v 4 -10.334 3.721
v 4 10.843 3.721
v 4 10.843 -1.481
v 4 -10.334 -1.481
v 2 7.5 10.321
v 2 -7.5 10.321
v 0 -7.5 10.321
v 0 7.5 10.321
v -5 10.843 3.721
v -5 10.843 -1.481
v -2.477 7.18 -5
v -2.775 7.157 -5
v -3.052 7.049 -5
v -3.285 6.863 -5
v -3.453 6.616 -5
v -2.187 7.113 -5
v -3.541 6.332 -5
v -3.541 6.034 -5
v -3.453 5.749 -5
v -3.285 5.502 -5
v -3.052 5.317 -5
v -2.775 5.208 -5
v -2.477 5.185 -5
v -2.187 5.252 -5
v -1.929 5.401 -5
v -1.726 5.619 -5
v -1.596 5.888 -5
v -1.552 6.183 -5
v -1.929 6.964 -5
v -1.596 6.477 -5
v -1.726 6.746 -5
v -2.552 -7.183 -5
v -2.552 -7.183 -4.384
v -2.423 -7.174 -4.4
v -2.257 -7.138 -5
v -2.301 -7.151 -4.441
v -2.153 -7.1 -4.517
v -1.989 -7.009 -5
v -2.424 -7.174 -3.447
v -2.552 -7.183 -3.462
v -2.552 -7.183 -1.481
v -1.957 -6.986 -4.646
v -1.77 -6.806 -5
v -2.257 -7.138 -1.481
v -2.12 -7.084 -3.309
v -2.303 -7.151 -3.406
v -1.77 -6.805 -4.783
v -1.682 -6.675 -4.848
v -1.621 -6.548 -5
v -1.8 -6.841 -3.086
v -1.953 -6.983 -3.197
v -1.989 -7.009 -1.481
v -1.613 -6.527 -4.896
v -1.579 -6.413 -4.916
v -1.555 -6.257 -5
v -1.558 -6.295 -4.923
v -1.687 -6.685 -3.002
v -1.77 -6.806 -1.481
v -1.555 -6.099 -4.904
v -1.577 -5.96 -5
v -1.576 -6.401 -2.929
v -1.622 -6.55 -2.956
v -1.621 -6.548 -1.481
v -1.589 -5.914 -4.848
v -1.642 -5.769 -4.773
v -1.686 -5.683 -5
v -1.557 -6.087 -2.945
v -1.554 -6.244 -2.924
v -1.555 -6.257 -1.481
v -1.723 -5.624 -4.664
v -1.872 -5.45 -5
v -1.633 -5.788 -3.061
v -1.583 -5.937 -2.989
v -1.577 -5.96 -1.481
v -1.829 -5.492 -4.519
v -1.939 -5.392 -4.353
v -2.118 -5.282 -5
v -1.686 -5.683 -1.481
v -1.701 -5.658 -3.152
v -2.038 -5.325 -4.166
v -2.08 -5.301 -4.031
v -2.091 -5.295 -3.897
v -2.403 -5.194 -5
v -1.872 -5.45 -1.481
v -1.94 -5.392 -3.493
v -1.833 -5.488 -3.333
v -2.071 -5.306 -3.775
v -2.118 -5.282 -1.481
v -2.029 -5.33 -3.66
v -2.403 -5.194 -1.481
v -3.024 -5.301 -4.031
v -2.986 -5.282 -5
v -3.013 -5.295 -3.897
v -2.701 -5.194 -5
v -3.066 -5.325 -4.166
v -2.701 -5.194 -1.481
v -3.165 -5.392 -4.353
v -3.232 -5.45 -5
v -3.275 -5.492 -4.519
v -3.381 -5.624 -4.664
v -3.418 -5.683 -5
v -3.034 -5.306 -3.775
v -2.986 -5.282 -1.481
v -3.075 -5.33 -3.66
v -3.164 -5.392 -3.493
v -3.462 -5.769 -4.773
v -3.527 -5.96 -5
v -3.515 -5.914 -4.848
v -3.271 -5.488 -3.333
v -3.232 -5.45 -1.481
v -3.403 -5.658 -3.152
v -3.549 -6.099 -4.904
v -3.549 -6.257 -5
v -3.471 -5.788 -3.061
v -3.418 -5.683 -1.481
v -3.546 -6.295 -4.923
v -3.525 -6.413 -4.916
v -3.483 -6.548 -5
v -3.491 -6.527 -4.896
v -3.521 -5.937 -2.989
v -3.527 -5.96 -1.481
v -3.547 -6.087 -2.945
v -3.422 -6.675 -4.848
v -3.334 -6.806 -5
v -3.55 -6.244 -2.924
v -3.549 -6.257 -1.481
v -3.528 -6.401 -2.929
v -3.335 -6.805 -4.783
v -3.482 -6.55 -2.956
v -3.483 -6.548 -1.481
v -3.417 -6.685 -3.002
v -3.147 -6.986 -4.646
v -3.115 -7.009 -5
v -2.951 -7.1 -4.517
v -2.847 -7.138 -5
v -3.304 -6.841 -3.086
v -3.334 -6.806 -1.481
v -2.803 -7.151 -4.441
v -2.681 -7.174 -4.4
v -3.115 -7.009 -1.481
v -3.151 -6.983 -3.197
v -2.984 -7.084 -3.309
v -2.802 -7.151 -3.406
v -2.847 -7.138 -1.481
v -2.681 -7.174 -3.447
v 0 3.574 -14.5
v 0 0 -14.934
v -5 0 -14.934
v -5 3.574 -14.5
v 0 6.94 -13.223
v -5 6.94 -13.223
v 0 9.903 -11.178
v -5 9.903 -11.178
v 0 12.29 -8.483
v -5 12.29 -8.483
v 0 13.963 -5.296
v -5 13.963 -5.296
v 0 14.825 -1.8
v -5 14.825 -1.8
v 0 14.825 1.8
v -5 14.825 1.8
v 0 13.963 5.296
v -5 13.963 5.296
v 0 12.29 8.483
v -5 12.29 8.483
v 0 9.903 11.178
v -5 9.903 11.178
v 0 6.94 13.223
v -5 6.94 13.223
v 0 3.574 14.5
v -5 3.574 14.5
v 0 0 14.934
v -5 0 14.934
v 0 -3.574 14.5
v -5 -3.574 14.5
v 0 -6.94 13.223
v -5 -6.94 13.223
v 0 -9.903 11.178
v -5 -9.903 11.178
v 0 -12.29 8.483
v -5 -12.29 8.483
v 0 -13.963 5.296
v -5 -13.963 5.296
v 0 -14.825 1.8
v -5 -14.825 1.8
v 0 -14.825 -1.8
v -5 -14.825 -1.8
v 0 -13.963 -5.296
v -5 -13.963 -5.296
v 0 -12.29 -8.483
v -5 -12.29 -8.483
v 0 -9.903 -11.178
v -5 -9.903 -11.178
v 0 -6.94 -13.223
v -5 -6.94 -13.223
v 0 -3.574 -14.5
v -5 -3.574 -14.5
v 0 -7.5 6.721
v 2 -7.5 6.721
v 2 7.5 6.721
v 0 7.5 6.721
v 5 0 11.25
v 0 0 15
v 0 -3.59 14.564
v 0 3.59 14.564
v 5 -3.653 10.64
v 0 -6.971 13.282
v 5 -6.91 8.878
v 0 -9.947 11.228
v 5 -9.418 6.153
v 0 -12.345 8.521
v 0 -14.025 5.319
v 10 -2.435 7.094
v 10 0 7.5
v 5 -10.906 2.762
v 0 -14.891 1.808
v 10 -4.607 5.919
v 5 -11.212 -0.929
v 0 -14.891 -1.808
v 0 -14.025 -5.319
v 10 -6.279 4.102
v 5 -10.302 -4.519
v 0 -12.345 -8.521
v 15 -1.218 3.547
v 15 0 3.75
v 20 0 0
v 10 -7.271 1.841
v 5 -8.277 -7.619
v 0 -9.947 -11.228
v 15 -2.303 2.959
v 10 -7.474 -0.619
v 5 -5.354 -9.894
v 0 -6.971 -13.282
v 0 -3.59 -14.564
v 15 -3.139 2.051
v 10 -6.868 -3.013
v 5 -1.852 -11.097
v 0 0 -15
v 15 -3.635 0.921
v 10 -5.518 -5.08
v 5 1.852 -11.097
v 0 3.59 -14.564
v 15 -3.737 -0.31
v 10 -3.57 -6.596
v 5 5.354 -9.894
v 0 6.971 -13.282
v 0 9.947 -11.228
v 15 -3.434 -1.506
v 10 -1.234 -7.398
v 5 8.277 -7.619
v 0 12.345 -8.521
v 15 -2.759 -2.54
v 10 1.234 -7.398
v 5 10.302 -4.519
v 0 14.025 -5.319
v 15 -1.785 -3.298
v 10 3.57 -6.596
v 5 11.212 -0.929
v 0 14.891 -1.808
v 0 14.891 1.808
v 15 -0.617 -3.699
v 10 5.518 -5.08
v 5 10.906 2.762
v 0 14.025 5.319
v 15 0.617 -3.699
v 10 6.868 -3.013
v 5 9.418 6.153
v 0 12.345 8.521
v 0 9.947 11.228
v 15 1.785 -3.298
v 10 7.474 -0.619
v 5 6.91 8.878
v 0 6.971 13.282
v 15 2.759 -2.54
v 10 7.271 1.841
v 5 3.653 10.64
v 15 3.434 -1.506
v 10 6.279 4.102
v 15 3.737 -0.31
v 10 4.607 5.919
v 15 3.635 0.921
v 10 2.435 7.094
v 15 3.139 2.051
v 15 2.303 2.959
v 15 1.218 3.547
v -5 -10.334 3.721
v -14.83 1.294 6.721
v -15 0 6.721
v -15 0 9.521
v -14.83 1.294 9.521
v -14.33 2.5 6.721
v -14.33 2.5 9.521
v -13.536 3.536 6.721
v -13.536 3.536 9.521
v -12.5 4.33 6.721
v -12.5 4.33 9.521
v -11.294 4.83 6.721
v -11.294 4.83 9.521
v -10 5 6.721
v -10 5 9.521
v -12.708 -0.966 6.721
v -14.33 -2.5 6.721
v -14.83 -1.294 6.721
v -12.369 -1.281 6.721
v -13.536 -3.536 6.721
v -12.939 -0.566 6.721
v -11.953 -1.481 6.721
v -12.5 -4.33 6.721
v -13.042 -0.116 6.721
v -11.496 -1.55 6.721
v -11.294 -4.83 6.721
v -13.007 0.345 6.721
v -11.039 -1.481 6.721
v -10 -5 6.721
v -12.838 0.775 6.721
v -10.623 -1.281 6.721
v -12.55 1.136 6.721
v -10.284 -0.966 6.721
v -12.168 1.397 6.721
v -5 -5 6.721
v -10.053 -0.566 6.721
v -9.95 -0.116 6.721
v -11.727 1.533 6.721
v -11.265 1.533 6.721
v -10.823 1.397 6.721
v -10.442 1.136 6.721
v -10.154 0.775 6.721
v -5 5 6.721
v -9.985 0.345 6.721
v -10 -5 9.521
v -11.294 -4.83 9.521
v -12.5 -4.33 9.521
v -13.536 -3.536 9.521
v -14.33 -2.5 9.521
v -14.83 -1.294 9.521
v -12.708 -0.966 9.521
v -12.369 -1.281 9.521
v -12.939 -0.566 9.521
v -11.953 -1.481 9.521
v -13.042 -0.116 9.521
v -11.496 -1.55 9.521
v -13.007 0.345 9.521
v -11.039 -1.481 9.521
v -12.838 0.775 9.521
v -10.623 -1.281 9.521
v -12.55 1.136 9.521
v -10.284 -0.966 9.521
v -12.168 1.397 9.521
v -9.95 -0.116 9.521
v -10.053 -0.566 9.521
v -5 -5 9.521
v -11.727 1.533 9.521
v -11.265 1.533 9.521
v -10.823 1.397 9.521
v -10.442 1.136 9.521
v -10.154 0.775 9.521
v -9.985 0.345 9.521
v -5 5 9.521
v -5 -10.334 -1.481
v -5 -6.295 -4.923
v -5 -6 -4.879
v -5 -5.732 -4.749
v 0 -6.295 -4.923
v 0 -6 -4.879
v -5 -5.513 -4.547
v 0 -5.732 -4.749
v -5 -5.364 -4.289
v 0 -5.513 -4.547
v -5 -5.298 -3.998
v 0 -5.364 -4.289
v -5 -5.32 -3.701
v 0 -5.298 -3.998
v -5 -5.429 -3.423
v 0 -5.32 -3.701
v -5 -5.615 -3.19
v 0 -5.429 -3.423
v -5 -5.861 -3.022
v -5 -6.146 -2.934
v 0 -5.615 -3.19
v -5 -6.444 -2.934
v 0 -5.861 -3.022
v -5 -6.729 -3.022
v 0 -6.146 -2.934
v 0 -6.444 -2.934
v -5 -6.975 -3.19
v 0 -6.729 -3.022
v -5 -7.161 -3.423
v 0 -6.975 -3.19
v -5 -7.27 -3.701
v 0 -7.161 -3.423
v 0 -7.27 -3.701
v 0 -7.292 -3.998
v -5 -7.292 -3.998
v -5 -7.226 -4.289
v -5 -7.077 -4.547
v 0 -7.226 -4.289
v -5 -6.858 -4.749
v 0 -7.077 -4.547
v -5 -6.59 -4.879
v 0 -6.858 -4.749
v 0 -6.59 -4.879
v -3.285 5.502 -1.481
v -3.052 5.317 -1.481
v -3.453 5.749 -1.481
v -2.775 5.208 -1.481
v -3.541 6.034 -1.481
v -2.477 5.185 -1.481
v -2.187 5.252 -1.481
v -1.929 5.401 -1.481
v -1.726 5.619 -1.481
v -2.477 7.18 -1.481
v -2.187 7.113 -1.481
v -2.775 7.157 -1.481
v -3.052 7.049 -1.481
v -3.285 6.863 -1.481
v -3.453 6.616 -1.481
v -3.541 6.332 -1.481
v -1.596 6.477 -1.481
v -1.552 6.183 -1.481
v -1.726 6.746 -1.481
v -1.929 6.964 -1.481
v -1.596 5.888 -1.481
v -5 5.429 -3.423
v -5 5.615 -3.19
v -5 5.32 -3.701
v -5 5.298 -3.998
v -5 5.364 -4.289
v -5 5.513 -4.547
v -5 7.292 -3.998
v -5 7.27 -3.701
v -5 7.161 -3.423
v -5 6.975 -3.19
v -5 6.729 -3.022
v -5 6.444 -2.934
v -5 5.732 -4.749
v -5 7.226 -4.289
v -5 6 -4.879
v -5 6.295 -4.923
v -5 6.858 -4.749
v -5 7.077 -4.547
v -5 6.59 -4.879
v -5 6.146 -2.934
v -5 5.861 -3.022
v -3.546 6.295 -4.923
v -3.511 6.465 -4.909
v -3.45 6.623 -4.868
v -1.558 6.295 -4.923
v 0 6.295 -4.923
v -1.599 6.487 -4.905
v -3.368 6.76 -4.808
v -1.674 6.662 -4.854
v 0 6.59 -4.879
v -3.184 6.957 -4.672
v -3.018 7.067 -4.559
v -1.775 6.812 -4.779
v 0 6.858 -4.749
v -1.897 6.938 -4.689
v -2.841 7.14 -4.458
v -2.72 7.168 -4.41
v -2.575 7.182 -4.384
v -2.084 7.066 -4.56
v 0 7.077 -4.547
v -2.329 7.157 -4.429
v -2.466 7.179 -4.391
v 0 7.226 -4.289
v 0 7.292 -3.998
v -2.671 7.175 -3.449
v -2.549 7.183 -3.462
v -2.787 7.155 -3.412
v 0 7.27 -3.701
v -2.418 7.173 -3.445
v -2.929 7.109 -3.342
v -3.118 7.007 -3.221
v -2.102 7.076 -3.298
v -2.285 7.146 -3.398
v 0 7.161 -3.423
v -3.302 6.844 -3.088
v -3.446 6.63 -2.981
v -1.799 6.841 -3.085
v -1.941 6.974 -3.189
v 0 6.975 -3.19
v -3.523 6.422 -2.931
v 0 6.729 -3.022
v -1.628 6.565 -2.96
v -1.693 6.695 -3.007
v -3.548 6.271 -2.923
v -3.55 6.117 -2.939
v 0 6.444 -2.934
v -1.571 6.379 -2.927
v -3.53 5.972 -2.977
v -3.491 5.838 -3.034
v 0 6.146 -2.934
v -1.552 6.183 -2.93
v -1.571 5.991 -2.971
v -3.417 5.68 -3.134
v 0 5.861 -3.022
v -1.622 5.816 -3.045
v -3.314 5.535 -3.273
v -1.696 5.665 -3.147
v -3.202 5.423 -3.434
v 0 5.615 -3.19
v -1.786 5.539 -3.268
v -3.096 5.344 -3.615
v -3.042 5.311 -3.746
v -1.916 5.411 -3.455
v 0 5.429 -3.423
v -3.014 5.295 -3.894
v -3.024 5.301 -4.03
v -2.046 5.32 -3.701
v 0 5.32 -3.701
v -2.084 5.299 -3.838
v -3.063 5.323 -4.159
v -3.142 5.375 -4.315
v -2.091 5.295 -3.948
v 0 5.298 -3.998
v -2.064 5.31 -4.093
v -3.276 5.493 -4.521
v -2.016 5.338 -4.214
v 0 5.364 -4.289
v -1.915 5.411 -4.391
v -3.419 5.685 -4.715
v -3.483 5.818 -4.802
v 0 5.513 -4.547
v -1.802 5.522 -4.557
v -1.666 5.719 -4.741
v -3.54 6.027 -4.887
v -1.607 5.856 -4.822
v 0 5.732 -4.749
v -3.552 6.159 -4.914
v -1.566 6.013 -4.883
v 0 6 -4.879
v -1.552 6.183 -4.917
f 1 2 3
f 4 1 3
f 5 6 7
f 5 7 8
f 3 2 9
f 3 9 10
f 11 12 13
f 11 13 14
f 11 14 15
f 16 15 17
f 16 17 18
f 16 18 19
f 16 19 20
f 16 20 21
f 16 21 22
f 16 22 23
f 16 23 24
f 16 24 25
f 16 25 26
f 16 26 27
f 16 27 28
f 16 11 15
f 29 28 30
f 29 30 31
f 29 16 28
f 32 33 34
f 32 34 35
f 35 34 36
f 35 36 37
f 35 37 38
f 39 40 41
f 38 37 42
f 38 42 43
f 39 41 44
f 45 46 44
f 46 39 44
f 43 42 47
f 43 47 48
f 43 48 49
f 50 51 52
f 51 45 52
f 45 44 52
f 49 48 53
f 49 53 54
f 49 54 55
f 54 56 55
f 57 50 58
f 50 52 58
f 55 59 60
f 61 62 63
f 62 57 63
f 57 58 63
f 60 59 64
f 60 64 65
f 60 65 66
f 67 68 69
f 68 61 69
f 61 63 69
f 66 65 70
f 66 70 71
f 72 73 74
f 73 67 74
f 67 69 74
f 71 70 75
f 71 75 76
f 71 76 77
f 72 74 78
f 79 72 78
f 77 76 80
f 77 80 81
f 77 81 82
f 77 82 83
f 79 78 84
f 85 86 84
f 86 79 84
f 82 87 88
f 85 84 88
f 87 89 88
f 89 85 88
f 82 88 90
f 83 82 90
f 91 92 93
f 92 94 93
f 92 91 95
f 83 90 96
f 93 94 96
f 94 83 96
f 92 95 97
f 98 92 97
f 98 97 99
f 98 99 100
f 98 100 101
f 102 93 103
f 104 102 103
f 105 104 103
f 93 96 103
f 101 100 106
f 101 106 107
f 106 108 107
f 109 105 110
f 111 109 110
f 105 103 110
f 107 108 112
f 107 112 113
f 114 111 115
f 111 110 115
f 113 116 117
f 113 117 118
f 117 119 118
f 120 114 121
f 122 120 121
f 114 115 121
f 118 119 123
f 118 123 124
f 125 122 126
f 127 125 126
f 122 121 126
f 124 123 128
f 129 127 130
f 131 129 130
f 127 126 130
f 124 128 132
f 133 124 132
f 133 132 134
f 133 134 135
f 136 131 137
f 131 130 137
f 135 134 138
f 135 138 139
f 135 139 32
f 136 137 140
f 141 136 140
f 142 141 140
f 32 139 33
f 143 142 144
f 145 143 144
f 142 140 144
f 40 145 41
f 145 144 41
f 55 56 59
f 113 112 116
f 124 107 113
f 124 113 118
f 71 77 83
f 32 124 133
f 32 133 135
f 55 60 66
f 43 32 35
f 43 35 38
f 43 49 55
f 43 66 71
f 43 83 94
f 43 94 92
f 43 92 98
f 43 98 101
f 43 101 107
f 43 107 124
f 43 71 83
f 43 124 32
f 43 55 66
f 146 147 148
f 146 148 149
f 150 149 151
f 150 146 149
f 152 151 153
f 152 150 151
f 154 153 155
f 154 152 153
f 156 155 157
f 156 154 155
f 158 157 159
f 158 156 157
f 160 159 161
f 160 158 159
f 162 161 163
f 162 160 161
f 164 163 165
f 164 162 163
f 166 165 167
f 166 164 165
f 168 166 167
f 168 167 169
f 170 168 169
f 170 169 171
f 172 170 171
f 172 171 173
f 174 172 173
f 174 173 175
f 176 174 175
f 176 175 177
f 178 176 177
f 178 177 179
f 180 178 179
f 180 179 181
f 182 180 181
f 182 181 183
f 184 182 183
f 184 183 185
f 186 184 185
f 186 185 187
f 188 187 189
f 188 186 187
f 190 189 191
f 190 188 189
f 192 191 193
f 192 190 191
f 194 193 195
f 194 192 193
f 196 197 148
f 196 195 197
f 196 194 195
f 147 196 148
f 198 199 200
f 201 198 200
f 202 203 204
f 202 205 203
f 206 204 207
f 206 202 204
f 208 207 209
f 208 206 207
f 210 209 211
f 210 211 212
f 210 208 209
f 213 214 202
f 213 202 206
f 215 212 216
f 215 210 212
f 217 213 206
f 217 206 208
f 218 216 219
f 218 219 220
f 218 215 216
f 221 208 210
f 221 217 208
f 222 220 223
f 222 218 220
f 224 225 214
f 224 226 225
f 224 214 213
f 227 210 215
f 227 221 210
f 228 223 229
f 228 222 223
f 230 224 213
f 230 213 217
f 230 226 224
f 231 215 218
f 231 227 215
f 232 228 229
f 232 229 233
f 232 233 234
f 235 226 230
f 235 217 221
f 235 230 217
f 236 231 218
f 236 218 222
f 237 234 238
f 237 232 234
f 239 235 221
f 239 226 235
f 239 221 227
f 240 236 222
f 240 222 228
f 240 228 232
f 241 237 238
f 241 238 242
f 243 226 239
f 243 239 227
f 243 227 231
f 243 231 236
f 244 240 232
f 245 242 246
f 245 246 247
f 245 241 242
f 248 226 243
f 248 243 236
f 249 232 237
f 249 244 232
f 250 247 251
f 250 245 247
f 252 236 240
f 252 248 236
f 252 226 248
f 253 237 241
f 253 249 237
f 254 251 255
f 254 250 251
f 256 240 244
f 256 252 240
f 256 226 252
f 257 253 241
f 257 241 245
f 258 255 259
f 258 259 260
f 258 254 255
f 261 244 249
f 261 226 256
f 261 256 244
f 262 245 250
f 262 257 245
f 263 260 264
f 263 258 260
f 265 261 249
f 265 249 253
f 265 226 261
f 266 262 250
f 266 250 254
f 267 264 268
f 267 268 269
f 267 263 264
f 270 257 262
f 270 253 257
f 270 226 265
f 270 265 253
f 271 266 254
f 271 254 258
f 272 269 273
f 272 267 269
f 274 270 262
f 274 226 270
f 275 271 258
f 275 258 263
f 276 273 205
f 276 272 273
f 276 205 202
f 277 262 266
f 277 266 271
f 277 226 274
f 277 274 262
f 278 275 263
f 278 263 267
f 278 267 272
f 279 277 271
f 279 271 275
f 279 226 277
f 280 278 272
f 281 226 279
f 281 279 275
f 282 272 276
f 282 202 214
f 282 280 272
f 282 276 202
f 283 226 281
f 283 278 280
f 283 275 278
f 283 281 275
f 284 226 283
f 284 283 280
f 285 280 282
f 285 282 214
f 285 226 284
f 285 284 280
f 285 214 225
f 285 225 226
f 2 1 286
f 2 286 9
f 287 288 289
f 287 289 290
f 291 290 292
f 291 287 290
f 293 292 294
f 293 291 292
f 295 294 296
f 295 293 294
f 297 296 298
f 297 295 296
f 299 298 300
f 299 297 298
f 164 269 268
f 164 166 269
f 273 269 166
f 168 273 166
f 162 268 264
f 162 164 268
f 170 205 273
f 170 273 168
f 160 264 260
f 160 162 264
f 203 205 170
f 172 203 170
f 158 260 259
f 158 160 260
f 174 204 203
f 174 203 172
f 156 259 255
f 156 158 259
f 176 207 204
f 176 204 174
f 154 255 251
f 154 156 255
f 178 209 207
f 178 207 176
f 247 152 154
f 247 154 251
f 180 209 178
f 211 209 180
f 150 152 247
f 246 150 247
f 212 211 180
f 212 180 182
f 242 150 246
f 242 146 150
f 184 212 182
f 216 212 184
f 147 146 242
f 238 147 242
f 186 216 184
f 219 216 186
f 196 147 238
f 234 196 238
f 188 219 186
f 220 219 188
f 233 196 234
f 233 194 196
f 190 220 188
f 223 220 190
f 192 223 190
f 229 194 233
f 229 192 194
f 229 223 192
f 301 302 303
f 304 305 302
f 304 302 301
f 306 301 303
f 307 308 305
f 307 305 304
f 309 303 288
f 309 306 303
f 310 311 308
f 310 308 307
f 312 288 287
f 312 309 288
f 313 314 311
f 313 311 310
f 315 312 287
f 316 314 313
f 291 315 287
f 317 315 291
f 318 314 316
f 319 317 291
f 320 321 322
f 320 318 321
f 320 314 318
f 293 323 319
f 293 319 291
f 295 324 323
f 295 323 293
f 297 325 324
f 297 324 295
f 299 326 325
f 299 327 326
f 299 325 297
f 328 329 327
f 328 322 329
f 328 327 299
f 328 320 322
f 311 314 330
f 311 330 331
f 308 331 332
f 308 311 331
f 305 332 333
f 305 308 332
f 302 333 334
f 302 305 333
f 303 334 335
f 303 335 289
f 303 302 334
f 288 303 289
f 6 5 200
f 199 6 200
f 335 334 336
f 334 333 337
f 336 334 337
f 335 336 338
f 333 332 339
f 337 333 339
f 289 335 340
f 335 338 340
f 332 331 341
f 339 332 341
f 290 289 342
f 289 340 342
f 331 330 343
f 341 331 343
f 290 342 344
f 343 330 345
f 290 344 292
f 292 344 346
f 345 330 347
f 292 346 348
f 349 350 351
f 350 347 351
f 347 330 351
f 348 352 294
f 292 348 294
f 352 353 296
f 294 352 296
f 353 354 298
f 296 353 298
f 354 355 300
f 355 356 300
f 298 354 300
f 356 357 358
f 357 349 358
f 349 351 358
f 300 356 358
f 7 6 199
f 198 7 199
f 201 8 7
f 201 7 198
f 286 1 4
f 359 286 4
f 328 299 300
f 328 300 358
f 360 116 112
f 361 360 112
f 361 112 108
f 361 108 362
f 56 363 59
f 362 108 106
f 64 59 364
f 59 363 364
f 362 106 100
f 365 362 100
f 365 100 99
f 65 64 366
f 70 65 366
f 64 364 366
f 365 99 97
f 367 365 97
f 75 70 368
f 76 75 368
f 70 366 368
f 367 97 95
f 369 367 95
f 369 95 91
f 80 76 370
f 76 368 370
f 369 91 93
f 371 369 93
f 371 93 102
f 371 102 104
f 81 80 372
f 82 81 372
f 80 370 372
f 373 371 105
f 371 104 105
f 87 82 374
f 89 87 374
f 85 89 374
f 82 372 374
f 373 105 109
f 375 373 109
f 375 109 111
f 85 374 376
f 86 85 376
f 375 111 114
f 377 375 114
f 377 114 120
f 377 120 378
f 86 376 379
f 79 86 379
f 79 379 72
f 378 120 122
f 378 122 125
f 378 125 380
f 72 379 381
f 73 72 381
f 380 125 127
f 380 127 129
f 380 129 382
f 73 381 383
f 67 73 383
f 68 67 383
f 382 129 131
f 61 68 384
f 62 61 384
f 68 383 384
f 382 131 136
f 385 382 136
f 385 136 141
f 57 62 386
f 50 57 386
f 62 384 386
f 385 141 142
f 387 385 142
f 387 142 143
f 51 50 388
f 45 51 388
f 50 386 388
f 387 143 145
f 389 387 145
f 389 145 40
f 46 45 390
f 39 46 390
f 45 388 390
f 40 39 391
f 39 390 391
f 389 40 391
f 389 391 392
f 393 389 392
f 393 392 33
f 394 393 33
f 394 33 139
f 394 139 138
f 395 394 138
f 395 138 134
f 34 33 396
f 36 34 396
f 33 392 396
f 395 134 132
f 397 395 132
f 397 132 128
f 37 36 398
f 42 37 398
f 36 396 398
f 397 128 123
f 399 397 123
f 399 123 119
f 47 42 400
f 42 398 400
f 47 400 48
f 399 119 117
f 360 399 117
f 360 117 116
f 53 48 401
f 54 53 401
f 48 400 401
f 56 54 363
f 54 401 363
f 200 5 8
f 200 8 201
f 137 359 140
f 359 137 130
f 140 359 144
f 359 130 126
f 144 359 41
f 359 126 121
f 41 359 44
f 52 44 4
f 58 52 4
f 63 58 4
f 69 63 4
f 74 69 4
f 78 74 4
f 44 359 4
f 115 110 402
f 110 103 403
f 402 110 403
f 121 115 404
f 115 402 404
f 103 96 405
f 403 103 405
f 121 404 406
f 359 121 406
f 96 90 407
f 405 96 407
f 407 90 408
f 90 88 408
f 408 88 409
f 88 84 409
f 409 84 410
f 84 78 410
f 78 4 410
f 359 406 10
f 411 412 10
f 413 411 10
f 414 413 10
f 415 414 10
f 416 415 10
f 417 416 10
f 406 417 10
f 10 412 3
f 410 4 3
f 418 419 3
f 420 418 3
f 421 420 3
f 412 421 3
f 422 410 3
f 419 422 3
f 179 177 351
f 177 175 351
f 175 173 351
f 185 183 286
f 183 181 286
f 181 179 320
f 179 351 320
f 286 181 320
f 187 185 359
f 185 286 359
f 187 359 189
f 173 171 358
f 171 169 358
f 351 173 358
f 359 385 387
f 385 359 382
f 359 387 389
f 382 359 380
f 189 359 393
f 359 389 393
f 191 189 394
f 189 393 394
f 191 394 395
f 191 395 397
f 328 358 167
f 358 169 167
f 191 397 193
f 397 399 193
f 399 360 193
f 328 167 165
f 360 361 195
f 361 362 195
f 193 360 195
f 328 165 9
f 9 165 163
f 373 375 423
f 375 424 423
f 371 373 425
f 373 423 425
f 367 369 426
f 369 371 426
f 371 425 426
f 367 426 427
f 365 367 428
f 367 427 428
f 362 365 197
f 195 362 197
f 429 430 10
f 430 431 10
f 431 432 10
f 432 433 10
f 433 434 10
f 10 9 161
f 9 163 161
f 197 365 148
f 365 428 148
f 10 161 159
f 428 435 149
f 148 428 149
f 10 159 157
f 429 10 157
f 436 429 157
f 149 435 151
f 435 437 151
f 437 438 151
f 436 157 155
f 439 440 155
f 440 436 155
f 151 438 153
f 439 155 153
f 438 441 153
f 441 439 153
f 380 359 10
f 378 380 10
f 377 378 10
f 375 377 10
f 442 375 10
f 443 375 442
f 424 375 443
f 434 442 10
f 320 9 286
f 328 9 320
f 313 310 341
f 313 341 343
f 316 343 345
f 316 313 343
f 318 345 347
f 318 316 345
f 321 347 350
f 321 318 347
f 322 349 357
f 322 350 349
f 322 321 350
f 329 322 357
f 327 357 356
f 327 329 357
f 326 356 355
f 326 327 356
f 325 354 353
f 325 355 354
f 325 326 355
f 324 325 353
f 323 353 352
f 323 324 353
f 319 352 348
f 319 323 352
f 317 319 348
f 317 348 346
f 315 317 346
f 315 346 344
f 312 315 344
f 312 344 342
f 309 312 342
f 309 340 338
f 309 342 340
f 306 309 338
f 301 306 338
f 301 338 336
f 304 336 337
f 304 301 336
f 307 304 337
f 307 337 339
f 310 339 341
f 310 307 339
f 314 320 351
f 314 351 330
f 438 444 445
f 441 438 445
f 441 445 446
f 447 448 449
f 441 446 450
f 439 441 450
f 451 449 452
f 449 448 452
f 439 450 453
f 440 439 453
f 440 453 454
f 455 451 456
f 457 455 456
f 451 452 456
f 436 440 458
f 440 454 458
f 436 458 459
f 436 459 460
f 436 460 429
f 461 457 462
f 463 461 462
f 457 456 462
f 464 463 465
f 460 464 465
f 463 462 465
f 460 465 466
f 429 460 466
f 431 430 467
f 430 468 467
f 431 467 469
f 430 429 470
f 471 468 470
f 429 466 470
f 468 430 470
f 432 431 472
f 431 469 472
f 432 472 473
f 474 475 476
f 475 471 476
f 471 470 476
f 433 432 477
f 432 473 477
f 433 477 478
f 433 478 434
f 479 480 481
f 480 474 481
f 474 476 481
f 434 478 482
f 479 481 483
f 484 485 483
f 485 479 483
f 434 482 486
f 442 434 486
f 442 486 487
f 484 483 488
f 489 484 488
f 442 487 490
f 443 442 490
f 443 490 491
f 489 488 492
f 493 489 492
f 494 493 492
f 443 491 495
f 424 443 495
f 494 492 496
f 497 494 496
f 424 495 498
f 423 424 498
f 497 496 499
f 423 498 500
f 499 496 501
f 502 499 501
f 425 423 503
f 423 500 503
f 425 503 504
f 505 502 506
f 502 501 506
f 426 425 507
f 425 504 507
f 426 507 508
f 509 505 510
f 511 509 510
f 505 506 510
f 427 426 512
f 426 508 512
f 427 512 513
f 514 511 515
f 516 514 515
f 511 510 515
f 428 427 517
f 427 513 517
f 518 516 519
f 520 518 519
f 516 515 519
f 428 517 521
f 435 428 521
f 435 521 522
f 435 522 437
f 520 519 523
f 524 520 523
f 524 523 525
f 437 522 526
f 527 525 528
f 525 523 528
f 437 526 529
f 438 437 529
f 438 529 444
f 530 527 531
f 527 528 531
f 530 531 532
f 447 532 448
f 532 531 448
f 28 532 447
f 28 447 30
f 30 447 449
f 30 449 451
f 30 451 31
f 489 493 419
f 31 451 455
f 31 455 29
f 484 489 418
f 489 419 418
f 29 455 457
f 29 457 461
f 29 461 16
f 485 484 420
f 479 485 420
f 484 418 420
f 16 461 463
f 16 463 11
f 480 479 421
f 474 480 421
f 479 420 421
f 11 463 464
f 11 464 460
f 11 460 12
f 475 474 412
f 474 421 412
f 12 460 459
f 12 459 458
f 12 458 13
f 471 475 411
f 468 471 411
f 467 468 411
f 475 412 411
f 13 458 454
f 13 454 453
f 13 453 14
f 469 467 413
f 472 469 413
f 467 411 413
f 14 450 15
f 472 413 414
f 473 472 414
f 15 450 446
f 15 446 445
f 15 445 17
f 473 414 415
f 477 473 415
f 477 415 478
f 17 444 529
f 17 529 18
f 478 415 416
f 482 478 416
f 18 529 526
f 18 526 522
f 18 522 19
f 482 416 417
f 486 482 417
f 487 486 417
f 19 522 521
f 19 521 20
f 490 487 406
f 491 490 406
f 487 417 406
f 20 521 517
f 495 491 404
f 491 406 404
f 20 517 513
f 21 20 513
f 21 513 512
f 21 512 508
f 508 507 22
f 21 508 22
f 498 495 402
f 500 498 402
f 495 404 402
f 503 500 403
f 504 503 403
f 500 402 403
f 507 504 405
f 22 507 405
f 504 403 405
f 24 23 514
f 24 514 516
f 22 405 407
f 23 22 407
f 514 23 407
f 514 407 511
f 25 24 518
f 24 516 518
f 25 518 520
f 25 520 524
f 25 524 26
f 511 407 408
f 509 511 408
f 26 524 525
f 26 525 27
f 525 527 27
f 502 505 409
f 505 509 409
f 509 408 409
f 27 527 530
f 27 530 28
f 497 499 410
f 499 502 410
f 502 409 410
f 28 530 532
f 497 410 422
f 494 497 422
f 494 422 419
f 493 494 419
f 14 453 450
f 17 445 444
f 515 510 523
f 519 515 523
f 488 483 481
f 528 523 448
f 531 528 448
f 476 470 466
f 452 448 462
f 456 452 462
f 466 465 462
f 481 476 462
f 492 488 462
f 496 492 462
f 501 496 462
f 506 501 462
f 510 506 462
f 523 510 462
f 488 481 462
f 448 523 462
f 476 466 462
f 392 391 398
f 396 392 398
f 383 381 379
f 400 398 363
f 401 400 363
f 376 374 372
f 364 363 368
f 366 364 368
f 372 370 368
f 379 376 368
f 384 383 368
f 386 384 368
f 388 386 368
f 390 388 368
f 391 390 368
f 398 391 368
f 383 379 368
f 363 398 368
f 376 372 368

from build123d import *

# Parameters (mm, degrees)
SKETCH3_R                = 14.933526733
BOSS_EXTRUDE2_DEPTH      = 5
SKETCH4_W                = 3.6
SKETCH4_H                = 15
CUT_EXTRUDE1_DEPTH       = 2
CUT_EXTRUDE1_DEPTH_BACK  = 30.620731291
CUT_EXTRUDE4_START       = 4
SKETCH6_W                = 5.202489895
SKETCH6_H                = 21.176797573
CUT_EXTRUDE4_DEPTH       = 34.154759474
SKETCH8_R                = 1
CUT_EXTRUDE6_DEPTH       = 5
SKETCH9_R                = 1
CUT_EXTRUDE9_DEPTH       = 5
SKETCH10_W               = 3.6
SKETCH10_H               = 15
BOSS_EXTRUDE3_DEPTH      = 15
CUT_EXTRUDE10_START      = -5
SKETCH11_W               = 0.8
SKETCH11_H               = 15
CUT_EXTRUDE10_DEPTH      = 12
SKETCH12_R               = 1.55
CUT_EXTRUDE11_DEPTH      = 30.154759474
CUT_EXTRUDE11_DEPTH_BACK = 30.154759474


with BuildPart() as part:
    # Sketch1 → Revolve2 (revolve)
    with BuildSketch(Plane.XY, mode=Mode.PRIVATE) as revolve2_sk:
        Polygon((0, 0), (0, 15), (20, 0), align=None)
    revolve(revolve2_sk.sketch.rotate(Axis((-31.294130364, 0, 0), (1, 0, 0)), 90), axis=Axis((-31.294130364, 0, 0), (1, 0, 0)))

    # Sketch3 → Boss-Extrude2 (add)
    with BuildSketch(Plane(origin=(0, 0, 0), x_dir=(0, 0, -1), z_dir=(1, 0, 0))):
        Circle(SKETCH3_R)
    extrude(amount=-BOSS_EXTRUDE2_DEPTH)

    # Sketch4 → Cut-Extrude1 (cut, two sides)
    with BuildSketch(Plane(origin=(0, 0, -0.886715275), x_dir=(0, 0, -1), z_dir=(1, 0, 0))) as cut_extrude1_sk:
        with Locations((-9.407876673, 0)):
            Rectangle(SKETCH4_W, SKETCH4_H)
    extrude(amount=CUT_EXTRUDE1_DEPTH, mode=Mode.SUBTRACT)
    extrude(cut_extrude1_sk.sketch, amount=-CUT_EXTRUDE1_DEPTH_BACK, mode=Mode.SUBTRACT)

    # Sketch6 → Cut-Extrude4 (cut, through all)
    with BuildSketch(Plane(origin=(0, 0, 0), x_dir=(0, 0, -1), z_dir=(1, 0, 0)).offset(CUT_EXTRUDE4_START)):
        with Locations((-1.119916451, 0.254630833)):
            Rectangle(SKETCH6_W, SKETCH6_H)
    extrude(amount=-CUT_EXTRUDE4_DEPTH, mode=Mode.SUBTRACT)

    # Sketch8 → Cut-Extrude6 (cut)
    with BuildSketch(Plane.XY):
        with Locations((-2.552019749, 6.182563449)):
            Circle(SKETCH8_R)
        with Locations(Location((-2.552019749, -6.182563449, 0), (0, 0, 270))):
            Circle(SKETCH8_R)
    extrude(amount=-CUT_EXTRUDE6_DEPTH, mode=Mode.SUBTRACT)

    # Sketch9 → Cut-Extrude9 (cut)
    with BuildSketch(Plane(origin=(0, 0, 0), x_dir=(0, 0, -1), z_dir=(1, 0, 0))):
        with Locations((3.923175217, -6.295020596)):
            Circle(SKETCH9_R)
        with Locations((3.923175217, 6.295020596)):
            Circle(SKETCH9_R)
    extrude(amount=-CUT_EXTRUDE9_DEPTH, mode=Mode.SUBTRACT)

    # Sketch10 → Boss-Extrude3 (add)
    with BuildSketch(Plane(origin=(0, 0, 0), x_dir=(0, 0, -1), z_dir=(1, 0, 0))):
        with Locations((-8.521161398, 0)):
            Rectangle(SKETCH10_W, SKETCH10_H)
    extrude(amount=-BOSS_EXTRUDE3_DEPTH)

    # Sketch11 → Cut-Extrude10 (cut)
    with BuildSketch(Plane(origin=(0, 0, 0), x_dir=(0, 0, -1), z_dir=(1, 0, 0)).offset(CUT_EXTRUDE10_START)):
        with Locations((-9.921161398, 0)):
            Rectangle(SKETCH11_W, SKETCH11_H)
    extrude(amount=-CUT_EXTRUDE10_DEPTH, mode=Mode.SUBTRACT)

    # Sketch12 → Cut-Extrude11 (cut, two sides)
    with BuildSketch(Plane.XY) as cut_extrude11_sk:
        with BuildLine():
            ThreePointArc((-15, 0), (-13.535533906, 3.535533906), (-10, 5))
            Line((-10, 5), (-5, 5))
            Line((-5, 5), (-5, 9.202194168))
            Line((-5, 9.202194168), (-18.010498555, 9.996270698))
            Line((-18.010498555, 9.996270698), (-16.284245229, -10.269943354))
            Line((-16.284245229, -10.269943354), (-5, -9.308764033))
            Line((-5, -9.308764033), (-5, -5))
            Line((-5, -5), (-10, -5))
            ThreePointArc((-10, -5), (-13.535533906, -3.535533906), (-15, 0))
        make_face()
        with Locations(Location((-11.495940447, 0, 0), (0, 0, 270))):
            Circle(SKETCH12_R)
    extrude(amount=CUT_EXTRUDE11_DEPTH, mode=Mode.SUBTRACT)
    extrude(cut_extrude11_sk.sketch, amount=-CUT_EXTRUDE11_DEPTH_BACK, mode=Mode.SUBTRACT)


solid = part.part
